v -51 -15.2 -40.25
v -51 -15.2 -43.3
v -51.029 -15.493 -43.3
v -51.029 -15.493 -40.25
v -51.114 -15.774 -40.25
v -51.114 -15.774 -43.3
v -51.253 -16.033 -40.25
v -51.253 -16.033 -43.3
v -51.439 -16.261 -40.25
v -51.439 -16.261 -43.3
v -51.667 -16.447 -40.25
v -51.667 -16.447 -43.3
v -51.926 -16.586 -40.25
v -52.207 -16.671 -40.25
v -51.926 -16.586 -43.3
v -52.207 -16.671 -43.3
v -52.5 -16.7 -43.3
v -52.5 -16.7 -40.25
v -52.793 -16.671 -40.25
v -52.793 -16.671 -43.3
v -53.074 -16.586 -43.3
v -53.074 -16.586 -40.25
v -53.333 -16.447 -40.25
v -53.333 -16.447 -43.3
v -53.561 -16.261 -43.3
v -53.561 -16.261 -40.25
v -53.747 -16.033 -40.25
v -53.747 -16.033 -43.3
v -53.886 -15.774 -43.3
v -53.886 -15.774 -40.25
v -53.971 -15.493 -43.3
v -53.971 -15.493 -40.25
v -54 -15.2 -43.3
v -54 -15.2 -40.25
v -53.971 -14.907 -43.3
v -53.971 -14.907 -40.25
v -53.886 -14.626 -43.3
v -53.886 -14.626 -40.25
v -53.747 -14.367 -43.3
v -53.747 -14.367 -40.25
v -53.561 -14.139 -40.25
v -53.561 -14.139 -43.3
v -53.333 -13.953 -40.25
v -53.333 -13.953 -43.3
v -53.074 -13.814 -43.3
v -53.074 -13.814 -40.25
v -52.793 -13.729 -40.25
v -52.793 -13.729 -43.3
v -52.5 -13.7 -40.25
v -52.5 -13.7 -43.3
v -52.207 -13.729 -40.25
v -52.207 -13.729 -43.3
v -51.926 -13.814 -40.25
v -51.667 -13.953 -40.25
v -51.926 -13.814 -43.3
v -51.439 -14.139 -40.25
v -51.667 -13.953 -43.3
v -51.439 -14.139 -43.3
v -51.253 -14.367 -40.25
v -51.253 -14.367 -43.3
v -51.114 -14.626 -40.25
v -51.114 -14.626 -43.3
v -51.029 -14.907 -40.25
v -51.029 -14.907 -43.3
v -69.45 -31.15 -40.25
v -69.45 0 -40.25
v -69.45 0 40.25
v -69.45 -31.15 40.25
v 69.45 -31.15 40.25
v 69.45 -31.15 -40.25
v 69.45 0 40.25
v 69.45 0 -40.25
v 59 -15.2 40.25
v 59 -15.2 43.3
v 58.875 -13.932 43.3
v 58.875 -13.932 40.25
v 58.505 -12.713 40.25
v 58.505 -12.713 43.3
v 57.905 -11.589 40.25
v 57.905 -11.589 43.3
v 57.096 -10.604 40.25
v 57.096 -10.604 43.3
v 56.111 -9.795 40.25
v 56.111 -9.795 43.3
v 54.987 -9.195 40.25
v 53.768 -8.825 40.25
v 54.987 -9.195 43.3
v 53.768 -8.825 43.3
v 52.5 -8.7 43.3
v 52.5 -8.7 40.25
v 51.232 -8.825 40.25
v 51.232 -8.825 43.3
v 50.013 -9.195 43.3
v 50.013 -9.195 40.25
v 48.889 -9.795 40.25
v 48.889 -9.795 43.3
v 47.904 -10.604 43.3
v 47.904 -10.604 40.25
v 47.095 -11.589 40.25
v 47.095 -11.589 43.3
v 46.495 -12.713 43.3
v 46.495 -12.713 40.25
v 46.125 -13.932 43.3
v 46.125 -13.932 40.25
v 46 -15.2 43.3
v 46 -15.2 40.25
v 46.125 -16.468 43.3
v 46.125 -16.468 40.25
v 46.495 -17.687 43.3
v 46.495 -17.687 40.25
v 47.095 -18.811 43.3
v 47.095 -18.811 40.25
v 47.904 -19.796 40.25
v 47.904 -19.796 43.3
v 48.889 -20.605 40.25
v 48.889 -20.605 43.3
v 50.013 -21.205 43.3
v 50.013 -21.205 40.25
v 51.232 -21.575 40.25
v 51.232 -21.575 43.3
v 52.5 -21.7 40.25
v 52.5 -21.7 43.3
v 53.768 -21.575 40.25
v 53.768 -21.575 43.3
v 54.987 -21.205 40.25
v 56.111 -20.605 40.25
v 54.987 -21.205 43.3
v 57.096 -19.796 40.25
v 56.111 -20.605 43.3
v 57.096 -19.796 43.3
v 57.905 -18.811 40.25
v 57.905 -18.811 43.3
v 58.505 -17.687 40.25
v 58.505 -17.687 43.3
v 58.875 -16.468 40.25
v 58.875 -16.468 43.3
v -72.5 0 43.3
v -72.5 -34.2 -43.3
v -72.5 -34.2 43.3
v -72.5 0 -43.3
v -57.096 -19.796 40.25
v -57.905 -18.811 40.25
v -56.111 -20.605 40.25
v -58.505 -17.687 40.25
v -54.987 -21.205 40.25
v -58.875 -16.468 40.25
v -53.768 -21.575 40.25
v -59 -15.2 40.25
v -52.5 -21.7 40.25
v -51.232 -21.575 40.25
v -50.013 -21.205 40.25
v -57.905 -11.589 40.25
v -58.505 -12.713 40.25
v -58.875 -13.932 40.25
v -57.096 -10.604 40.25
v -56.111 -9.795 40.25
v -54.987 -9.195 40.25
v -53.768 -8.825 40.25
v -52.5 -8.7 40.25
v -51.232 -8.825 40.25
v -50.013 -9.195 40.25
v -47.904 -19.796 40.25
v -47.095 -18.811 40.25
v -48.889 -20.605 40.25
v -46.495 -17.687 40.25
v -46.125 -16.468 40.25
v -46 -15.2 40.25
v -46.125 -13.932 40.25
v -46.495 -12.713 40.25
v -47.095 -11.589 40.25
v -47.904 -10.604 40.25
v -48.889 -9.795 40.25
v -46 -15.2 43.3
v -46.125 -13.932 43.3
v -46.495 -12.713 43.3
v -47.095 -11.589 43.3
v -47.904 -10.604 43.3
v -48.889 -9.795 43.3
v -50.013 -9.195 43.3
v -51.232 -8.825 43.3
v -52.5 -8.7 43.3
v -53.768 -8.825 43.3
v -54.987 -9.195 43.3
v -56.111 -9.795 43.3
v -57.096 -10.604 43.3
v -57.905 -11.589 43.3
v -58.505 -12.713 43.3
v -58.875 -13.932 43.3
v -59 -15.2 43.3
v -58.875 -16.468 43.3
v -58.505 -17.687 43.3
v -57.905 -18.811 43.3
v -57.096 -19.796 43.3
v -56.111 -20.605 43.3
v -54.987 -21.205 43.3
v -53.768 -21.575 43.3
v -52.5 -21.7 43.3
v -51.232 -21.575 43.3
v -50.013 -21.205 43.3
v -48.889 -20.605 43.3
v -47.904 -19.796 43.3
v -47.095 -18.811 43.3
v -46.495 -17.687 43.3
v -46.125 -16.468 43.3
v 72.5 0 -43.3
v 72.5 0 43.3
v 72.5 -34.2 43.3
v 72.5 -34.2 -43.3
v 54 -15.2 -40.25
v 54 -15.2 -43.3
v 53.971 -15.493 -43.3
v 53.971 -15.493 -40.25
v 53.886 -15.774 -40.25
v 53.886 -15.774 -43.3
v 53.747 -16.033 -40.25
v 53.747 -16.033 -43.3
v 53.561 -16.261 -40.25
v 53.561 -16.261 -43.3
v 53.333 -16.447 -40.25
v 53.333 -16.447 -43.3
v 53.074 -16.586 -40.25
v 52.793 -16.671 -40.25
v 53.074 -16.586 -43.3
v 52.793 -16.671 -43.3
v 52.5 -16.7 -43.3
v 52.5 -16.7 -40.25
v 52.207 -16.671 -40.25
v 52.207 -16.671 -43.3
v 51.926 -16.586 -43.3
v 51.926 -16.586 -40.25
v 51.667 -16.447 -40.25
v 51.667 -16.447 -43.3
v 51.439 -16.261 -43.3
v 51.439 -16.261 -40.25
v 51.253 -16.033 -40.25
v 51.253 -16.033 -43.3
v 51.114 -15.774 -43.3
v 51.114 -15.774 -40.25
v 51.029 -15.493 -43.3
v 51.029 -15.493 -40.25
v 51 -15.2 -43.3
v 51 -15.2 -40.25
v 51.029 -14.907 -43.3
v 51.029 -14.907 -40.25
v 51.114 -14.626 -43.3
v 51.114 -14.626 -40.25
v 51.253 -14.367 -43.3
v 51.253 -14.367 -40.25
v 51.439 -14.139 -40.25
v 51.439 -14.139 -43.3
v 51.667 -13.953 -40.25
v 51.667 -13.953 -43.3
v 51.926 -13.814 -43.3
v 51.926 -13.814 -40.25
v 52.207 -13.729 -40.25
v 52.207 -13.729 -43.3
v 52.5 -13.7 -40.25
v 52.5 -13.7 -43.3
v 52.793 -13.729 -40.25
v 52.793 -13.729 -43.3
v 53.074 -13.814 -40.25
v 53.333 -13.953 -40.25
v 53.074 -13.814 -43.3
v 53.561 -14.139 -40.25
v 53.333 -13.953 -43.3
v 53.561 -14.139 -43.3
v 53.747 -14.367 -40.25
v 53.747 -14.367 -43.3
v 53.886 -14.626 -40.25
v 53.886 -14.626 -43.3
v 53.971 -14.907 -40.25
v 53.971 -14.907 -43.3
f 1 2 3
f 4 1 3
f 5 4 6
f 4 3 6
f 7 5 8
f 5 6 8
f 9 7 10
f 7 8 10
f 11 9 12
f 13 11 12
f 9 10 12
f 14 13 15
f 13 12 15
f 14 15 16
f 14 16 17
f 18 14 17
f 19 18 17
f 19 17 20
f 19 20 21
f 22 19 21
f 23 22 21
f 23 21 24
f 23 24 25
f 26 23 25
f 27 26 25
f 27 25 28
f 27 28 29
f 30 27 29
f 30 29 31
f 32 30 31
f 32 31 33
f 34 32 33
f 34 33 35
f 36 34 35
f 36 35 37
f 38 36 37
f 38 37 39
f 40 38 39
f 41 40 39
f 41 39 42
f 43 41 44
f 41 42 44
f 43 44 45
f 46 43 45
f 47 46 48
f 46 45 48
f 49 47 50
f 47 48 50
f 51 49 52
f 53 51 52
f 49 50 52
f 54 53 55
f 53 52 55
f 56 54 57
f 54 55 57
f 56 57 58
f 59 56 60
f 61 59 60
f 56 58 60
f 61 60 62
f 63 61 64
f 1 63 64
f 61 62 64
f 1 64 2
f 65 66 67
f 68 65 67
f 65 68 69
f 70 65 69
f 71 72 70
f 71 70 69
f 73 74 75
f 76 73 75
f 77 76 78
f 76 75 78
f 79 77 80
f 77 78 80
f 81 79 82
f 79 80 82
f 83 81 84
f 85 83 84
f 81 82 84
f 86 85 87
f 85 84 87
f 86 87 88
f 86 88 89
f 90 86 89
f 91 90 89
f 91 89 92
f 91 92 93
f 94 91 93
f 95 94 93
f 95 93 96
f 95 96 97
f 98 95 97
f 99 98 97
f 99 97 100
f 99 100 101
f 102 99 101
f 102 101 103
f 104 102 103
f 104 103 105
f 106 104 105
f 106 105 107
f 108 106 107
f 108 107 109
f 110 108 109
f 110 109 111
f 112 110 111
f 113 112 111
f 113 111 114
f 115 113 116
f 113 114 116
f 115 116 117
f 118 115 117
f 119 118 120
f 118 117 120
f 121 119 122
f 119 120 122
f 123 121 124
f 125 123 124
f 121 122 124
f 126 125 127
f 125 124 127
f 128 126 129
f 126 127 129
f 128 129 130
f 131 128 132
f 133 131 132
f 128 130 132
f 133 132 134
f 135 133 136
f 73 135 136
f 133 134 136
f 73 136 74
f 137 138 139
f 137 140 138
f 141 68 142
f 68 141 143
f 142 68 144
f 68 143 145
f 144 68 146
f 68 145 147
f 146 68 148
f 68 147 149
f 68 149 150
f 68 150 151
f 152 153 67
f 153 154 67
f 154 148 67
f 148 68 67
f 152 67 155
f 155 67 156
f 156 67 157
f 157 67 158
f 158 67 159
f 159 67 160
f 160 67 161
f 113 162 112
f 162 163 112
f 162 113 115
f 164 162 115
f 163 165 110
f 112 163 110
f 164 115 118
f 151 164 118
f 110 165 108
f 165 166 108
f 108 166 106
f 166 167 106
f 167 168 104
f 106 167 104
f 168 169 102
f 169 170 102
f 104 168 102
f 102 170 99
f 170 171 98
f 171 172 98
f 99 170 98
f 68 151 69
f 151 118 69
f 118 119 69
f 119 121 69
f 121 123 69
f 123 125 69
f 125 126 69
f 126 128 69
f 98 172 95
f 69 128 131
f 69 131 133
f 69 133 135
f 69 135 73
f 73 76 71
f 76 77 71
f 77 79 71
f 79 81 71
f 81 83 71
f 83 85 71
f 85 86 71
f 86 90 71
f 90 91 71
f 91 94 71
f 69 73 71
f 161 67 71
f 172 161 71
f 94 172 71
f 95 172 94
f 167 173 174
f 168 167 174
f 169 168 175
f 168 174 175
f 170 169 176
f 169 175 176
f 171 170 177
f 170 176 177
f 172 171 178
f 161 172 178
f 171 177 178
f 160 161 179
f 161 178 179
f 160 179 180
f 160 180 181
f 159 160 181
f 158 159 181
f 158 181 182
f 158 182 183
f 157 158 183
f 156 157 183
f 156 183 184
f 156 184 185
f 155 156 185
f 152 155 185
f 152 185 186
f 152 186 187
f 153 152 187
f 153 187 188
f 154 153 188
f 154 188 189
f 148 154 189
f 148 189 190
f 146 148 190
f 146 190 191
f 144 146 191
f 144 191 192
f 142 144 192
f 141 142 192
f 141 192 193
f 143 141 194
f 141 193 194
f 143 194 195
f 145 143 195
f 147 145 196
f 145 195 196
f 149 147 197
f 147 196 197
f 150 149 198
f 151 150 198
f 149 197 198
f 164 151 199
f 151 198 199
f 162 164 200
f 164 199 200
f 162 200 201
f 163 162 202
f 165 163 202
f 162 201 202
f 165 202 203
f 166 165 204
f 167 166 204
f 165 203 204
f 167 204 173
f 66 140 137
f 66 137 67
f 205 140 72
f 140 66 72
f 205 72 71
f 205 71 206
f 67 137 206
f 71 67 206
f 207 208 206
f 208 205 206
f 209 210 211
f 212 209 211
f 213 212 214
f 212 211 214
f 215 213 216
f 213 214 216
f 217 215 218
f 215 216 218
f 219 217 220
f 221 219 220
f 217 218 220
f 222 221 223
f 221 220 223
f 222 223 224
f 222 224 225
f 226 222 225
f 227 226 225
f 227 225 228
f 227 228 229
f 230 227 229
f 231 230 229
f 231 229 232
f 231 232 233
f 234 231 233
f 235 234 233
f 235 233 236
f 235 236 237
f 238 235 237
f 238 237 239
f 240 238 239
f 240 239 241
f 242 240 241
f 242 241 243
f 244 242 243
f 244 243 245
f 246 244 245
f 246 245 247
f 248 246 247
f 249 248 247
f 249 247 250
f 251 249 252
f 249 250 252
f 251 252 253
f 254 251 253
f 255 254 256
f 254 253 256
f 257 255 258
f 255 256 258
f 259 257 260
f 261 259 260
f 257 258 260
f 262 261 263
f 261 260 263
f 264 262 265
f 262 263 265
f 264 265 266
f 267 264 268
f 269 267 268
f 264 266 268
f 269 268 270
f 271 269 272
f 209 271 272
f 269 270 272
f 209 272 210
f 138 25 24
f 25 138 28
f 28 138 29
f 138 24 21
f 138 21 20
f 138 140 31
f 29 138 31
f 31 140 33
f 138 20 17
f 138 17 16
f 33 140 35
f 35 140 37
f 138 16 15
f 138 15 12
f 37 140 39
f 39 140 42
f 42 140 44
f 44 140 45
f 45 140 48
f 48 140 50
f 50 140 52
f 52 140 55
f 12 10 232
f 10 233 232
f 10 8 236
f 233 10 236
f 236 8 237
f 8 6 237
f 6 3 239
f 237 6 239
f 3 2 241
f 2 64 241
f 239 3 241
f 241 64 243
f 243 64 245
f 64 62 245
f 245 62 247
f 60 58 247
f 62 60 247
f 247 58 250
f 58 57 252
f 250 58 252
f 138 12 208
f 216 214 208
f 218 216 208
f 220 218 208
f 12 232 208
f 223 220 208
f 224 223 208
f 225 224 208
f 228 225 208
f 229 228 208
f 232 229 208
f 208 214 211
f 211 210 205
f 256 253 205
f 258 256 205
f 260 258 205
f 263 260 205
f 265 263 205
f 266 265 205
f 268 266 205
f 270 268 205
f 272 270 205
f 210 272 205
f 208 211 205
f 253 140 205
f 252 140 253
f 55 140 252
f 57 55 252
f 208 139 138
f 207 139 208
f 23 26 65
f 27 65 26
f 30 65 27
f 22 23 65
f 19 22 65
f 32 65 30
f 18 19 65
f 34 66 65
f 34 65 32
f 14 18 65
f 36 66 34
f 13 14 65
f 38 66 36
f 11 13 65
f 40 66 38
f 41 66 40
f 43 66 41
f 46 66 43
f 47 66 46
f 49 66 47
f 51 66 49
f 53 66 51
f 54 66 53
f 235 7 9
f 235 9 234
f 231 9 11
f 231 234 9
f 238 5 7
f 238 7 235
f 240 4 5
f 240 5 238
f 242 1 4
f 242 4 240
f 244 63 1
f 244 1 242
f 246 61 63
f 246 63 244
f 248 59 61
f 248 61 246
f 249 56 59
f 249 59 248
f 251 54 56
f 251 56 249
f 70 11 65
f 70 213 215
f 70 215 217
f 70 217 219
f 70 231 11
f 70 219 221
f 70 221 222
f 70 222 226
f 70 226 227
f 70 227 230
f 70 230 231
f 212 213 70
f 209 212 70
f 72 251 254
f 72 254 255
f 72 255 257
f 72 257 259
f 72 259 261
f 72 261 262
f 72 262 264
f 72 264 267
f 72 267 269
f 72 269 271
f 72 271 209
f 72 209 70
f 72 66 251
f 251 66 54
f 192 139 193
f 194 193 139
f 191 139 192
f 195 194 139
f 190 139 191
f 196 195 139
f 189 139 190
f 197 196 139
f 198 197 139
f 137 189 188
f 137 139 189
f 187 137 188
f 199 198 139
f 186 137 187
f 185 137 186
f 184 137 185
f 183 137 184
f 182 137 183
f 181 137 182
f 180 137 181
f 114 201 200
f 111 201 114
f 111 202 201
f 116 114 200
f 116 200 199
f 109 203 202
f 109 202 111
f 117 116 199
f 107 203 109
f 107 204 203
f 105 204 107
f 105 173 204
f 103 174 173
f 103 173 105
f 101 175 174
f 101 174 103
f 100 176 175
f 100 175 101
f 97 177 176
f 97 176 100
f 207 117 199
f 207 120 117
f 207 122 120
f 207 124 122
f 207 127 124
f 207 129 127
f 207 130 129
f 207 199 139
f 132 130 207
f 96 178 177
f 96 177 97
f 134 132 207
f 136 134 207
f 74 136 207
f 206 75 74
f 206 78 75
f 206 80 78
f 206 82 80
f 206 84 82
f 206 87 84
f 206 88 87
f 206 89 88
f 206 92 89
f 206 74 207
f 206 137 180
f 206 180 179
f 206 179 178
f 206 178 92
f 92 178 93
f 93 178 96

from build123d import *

# Parameters (mm, degrees)
F0_W     = 145
F0_H     = 86.6
F0_W_2   = 138.9
F0_H_2   = 80.5
F1_DEPTH = 31.15
F2_W     = 145
F2_H     = 86.6
F3_DEPTH = 3.05
F4_R     = 6.5
F5_DEPTH = 25
F6_R     = 1.5
F7_DEPTH = 25


with BuildPart() as f1:
    # F0 (on Front) → F1 (new body)
    with BuildSketch(Plane.XZ):
        Rectangle(F0_W, F0_H)
        Rectangle(F0_W_2, F0_H_2, mode=Mode.SUBTRACT)
    extrude(amount=F1_DEPTH)

    # F2 (on face) → F3 (join)
    with BuildSketch(Plane.XZ.offset(31.15)):
        Rectangle(F2_W, F2_H)
    extrude(amount=F3_DEPTH)

    # F4 (on face) → F5 (cut)
    with BuildSketch(Plane.XY.offset(43.3)):
        with Locations((-52.5, -15.2)):
            Circle(F4_R)
        with Locations((52.5, -15.2)):
            Circle(F4_R)
    extrude(amount=-F5_DEPTH, mode=Mode.SUBTRACT)

    # F6 (on face) → F7 (cut)
    with BuildSketch(Plane(origin=(0, 0, -43.3), x_dir=(1, 0, 0), z_dir=(0, 0, -1))):
        with Locations((-52.5, 15.2)):
            Circle(F6_R)
        with Locations((52.5, 15.2)):
            Circle(F6_R)
    extrude(amount=-F7_DEPTH, mode=Mode.SUBTRACT)


solid = f1.part
